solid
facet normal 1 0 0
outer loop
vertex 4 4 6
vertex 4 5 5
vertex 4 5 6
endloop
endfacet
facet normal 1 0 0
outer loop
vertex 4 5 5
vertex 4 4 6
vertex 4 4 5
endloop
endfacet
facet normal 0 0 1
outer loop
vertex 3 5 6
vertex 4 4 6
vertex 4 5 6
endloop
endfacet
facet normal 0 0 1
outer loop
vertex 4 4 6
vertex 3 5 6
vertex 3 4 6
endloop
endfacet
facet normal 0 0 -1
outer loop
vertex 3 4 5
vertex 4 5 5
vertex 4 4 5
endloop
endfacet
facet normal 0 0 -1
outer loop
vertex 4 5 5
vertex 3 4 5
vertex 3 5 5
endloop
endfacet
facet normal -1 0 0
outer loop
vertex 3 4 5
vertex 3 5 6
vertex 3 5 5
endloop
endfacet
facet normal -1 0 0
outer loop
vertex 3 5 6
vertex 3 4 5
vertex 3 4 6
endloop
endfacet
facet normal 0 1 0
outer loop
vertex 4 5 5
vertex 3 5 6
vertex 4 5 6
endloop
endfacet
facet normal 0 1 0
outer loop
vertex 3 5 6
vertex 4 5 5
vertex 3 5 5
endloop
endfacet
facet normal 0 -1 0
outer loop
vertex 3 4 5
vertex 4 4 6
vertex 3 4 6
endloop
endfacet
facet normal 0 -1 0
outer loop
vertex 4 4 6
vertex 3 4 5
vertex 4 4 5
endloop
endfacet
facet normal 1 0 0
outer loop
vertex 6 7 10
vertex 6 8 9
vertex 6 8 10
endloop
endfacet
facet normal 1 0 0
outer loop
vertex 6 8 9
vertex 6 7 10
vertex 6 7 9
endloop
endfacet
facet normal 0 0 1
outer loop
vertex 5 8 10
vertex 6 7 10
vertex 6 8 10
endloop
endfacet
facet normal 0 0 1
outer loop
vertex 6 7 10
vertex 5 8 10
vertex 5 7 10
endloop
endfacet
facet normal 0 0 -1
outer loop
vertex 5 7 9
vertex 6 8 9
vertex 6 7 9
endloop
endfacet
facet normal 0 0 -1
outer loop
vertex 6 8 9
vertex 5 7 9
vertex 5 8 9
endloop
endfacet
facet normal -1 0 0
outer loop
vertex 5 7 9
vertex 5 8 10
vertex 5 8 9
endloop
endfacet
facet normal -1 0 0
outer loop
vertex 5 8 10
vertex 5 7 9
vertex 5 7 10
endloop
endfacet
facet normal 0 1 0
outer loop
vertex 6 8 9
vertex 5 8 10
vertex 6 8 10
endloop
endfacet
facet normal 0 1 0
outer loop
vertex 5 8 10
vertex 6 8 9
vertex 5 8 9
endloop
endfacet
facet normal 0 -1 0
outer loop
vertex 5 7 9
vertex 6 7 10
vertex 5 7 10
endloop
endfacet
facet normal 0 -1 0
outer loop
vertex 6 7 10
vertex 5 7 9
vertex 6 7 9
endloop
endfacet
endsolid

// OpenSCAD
// Create matrix
mr = 	[
[3,4,5],
[5,7,9],
		];
// Draw cubes
// Z-axis
for (a =[0:len(mr)-1]){
	color([1,0,0]) translate([mr[a][0], mr[a][1], mr[a][2]])cube([1,1,1]);
			
}
